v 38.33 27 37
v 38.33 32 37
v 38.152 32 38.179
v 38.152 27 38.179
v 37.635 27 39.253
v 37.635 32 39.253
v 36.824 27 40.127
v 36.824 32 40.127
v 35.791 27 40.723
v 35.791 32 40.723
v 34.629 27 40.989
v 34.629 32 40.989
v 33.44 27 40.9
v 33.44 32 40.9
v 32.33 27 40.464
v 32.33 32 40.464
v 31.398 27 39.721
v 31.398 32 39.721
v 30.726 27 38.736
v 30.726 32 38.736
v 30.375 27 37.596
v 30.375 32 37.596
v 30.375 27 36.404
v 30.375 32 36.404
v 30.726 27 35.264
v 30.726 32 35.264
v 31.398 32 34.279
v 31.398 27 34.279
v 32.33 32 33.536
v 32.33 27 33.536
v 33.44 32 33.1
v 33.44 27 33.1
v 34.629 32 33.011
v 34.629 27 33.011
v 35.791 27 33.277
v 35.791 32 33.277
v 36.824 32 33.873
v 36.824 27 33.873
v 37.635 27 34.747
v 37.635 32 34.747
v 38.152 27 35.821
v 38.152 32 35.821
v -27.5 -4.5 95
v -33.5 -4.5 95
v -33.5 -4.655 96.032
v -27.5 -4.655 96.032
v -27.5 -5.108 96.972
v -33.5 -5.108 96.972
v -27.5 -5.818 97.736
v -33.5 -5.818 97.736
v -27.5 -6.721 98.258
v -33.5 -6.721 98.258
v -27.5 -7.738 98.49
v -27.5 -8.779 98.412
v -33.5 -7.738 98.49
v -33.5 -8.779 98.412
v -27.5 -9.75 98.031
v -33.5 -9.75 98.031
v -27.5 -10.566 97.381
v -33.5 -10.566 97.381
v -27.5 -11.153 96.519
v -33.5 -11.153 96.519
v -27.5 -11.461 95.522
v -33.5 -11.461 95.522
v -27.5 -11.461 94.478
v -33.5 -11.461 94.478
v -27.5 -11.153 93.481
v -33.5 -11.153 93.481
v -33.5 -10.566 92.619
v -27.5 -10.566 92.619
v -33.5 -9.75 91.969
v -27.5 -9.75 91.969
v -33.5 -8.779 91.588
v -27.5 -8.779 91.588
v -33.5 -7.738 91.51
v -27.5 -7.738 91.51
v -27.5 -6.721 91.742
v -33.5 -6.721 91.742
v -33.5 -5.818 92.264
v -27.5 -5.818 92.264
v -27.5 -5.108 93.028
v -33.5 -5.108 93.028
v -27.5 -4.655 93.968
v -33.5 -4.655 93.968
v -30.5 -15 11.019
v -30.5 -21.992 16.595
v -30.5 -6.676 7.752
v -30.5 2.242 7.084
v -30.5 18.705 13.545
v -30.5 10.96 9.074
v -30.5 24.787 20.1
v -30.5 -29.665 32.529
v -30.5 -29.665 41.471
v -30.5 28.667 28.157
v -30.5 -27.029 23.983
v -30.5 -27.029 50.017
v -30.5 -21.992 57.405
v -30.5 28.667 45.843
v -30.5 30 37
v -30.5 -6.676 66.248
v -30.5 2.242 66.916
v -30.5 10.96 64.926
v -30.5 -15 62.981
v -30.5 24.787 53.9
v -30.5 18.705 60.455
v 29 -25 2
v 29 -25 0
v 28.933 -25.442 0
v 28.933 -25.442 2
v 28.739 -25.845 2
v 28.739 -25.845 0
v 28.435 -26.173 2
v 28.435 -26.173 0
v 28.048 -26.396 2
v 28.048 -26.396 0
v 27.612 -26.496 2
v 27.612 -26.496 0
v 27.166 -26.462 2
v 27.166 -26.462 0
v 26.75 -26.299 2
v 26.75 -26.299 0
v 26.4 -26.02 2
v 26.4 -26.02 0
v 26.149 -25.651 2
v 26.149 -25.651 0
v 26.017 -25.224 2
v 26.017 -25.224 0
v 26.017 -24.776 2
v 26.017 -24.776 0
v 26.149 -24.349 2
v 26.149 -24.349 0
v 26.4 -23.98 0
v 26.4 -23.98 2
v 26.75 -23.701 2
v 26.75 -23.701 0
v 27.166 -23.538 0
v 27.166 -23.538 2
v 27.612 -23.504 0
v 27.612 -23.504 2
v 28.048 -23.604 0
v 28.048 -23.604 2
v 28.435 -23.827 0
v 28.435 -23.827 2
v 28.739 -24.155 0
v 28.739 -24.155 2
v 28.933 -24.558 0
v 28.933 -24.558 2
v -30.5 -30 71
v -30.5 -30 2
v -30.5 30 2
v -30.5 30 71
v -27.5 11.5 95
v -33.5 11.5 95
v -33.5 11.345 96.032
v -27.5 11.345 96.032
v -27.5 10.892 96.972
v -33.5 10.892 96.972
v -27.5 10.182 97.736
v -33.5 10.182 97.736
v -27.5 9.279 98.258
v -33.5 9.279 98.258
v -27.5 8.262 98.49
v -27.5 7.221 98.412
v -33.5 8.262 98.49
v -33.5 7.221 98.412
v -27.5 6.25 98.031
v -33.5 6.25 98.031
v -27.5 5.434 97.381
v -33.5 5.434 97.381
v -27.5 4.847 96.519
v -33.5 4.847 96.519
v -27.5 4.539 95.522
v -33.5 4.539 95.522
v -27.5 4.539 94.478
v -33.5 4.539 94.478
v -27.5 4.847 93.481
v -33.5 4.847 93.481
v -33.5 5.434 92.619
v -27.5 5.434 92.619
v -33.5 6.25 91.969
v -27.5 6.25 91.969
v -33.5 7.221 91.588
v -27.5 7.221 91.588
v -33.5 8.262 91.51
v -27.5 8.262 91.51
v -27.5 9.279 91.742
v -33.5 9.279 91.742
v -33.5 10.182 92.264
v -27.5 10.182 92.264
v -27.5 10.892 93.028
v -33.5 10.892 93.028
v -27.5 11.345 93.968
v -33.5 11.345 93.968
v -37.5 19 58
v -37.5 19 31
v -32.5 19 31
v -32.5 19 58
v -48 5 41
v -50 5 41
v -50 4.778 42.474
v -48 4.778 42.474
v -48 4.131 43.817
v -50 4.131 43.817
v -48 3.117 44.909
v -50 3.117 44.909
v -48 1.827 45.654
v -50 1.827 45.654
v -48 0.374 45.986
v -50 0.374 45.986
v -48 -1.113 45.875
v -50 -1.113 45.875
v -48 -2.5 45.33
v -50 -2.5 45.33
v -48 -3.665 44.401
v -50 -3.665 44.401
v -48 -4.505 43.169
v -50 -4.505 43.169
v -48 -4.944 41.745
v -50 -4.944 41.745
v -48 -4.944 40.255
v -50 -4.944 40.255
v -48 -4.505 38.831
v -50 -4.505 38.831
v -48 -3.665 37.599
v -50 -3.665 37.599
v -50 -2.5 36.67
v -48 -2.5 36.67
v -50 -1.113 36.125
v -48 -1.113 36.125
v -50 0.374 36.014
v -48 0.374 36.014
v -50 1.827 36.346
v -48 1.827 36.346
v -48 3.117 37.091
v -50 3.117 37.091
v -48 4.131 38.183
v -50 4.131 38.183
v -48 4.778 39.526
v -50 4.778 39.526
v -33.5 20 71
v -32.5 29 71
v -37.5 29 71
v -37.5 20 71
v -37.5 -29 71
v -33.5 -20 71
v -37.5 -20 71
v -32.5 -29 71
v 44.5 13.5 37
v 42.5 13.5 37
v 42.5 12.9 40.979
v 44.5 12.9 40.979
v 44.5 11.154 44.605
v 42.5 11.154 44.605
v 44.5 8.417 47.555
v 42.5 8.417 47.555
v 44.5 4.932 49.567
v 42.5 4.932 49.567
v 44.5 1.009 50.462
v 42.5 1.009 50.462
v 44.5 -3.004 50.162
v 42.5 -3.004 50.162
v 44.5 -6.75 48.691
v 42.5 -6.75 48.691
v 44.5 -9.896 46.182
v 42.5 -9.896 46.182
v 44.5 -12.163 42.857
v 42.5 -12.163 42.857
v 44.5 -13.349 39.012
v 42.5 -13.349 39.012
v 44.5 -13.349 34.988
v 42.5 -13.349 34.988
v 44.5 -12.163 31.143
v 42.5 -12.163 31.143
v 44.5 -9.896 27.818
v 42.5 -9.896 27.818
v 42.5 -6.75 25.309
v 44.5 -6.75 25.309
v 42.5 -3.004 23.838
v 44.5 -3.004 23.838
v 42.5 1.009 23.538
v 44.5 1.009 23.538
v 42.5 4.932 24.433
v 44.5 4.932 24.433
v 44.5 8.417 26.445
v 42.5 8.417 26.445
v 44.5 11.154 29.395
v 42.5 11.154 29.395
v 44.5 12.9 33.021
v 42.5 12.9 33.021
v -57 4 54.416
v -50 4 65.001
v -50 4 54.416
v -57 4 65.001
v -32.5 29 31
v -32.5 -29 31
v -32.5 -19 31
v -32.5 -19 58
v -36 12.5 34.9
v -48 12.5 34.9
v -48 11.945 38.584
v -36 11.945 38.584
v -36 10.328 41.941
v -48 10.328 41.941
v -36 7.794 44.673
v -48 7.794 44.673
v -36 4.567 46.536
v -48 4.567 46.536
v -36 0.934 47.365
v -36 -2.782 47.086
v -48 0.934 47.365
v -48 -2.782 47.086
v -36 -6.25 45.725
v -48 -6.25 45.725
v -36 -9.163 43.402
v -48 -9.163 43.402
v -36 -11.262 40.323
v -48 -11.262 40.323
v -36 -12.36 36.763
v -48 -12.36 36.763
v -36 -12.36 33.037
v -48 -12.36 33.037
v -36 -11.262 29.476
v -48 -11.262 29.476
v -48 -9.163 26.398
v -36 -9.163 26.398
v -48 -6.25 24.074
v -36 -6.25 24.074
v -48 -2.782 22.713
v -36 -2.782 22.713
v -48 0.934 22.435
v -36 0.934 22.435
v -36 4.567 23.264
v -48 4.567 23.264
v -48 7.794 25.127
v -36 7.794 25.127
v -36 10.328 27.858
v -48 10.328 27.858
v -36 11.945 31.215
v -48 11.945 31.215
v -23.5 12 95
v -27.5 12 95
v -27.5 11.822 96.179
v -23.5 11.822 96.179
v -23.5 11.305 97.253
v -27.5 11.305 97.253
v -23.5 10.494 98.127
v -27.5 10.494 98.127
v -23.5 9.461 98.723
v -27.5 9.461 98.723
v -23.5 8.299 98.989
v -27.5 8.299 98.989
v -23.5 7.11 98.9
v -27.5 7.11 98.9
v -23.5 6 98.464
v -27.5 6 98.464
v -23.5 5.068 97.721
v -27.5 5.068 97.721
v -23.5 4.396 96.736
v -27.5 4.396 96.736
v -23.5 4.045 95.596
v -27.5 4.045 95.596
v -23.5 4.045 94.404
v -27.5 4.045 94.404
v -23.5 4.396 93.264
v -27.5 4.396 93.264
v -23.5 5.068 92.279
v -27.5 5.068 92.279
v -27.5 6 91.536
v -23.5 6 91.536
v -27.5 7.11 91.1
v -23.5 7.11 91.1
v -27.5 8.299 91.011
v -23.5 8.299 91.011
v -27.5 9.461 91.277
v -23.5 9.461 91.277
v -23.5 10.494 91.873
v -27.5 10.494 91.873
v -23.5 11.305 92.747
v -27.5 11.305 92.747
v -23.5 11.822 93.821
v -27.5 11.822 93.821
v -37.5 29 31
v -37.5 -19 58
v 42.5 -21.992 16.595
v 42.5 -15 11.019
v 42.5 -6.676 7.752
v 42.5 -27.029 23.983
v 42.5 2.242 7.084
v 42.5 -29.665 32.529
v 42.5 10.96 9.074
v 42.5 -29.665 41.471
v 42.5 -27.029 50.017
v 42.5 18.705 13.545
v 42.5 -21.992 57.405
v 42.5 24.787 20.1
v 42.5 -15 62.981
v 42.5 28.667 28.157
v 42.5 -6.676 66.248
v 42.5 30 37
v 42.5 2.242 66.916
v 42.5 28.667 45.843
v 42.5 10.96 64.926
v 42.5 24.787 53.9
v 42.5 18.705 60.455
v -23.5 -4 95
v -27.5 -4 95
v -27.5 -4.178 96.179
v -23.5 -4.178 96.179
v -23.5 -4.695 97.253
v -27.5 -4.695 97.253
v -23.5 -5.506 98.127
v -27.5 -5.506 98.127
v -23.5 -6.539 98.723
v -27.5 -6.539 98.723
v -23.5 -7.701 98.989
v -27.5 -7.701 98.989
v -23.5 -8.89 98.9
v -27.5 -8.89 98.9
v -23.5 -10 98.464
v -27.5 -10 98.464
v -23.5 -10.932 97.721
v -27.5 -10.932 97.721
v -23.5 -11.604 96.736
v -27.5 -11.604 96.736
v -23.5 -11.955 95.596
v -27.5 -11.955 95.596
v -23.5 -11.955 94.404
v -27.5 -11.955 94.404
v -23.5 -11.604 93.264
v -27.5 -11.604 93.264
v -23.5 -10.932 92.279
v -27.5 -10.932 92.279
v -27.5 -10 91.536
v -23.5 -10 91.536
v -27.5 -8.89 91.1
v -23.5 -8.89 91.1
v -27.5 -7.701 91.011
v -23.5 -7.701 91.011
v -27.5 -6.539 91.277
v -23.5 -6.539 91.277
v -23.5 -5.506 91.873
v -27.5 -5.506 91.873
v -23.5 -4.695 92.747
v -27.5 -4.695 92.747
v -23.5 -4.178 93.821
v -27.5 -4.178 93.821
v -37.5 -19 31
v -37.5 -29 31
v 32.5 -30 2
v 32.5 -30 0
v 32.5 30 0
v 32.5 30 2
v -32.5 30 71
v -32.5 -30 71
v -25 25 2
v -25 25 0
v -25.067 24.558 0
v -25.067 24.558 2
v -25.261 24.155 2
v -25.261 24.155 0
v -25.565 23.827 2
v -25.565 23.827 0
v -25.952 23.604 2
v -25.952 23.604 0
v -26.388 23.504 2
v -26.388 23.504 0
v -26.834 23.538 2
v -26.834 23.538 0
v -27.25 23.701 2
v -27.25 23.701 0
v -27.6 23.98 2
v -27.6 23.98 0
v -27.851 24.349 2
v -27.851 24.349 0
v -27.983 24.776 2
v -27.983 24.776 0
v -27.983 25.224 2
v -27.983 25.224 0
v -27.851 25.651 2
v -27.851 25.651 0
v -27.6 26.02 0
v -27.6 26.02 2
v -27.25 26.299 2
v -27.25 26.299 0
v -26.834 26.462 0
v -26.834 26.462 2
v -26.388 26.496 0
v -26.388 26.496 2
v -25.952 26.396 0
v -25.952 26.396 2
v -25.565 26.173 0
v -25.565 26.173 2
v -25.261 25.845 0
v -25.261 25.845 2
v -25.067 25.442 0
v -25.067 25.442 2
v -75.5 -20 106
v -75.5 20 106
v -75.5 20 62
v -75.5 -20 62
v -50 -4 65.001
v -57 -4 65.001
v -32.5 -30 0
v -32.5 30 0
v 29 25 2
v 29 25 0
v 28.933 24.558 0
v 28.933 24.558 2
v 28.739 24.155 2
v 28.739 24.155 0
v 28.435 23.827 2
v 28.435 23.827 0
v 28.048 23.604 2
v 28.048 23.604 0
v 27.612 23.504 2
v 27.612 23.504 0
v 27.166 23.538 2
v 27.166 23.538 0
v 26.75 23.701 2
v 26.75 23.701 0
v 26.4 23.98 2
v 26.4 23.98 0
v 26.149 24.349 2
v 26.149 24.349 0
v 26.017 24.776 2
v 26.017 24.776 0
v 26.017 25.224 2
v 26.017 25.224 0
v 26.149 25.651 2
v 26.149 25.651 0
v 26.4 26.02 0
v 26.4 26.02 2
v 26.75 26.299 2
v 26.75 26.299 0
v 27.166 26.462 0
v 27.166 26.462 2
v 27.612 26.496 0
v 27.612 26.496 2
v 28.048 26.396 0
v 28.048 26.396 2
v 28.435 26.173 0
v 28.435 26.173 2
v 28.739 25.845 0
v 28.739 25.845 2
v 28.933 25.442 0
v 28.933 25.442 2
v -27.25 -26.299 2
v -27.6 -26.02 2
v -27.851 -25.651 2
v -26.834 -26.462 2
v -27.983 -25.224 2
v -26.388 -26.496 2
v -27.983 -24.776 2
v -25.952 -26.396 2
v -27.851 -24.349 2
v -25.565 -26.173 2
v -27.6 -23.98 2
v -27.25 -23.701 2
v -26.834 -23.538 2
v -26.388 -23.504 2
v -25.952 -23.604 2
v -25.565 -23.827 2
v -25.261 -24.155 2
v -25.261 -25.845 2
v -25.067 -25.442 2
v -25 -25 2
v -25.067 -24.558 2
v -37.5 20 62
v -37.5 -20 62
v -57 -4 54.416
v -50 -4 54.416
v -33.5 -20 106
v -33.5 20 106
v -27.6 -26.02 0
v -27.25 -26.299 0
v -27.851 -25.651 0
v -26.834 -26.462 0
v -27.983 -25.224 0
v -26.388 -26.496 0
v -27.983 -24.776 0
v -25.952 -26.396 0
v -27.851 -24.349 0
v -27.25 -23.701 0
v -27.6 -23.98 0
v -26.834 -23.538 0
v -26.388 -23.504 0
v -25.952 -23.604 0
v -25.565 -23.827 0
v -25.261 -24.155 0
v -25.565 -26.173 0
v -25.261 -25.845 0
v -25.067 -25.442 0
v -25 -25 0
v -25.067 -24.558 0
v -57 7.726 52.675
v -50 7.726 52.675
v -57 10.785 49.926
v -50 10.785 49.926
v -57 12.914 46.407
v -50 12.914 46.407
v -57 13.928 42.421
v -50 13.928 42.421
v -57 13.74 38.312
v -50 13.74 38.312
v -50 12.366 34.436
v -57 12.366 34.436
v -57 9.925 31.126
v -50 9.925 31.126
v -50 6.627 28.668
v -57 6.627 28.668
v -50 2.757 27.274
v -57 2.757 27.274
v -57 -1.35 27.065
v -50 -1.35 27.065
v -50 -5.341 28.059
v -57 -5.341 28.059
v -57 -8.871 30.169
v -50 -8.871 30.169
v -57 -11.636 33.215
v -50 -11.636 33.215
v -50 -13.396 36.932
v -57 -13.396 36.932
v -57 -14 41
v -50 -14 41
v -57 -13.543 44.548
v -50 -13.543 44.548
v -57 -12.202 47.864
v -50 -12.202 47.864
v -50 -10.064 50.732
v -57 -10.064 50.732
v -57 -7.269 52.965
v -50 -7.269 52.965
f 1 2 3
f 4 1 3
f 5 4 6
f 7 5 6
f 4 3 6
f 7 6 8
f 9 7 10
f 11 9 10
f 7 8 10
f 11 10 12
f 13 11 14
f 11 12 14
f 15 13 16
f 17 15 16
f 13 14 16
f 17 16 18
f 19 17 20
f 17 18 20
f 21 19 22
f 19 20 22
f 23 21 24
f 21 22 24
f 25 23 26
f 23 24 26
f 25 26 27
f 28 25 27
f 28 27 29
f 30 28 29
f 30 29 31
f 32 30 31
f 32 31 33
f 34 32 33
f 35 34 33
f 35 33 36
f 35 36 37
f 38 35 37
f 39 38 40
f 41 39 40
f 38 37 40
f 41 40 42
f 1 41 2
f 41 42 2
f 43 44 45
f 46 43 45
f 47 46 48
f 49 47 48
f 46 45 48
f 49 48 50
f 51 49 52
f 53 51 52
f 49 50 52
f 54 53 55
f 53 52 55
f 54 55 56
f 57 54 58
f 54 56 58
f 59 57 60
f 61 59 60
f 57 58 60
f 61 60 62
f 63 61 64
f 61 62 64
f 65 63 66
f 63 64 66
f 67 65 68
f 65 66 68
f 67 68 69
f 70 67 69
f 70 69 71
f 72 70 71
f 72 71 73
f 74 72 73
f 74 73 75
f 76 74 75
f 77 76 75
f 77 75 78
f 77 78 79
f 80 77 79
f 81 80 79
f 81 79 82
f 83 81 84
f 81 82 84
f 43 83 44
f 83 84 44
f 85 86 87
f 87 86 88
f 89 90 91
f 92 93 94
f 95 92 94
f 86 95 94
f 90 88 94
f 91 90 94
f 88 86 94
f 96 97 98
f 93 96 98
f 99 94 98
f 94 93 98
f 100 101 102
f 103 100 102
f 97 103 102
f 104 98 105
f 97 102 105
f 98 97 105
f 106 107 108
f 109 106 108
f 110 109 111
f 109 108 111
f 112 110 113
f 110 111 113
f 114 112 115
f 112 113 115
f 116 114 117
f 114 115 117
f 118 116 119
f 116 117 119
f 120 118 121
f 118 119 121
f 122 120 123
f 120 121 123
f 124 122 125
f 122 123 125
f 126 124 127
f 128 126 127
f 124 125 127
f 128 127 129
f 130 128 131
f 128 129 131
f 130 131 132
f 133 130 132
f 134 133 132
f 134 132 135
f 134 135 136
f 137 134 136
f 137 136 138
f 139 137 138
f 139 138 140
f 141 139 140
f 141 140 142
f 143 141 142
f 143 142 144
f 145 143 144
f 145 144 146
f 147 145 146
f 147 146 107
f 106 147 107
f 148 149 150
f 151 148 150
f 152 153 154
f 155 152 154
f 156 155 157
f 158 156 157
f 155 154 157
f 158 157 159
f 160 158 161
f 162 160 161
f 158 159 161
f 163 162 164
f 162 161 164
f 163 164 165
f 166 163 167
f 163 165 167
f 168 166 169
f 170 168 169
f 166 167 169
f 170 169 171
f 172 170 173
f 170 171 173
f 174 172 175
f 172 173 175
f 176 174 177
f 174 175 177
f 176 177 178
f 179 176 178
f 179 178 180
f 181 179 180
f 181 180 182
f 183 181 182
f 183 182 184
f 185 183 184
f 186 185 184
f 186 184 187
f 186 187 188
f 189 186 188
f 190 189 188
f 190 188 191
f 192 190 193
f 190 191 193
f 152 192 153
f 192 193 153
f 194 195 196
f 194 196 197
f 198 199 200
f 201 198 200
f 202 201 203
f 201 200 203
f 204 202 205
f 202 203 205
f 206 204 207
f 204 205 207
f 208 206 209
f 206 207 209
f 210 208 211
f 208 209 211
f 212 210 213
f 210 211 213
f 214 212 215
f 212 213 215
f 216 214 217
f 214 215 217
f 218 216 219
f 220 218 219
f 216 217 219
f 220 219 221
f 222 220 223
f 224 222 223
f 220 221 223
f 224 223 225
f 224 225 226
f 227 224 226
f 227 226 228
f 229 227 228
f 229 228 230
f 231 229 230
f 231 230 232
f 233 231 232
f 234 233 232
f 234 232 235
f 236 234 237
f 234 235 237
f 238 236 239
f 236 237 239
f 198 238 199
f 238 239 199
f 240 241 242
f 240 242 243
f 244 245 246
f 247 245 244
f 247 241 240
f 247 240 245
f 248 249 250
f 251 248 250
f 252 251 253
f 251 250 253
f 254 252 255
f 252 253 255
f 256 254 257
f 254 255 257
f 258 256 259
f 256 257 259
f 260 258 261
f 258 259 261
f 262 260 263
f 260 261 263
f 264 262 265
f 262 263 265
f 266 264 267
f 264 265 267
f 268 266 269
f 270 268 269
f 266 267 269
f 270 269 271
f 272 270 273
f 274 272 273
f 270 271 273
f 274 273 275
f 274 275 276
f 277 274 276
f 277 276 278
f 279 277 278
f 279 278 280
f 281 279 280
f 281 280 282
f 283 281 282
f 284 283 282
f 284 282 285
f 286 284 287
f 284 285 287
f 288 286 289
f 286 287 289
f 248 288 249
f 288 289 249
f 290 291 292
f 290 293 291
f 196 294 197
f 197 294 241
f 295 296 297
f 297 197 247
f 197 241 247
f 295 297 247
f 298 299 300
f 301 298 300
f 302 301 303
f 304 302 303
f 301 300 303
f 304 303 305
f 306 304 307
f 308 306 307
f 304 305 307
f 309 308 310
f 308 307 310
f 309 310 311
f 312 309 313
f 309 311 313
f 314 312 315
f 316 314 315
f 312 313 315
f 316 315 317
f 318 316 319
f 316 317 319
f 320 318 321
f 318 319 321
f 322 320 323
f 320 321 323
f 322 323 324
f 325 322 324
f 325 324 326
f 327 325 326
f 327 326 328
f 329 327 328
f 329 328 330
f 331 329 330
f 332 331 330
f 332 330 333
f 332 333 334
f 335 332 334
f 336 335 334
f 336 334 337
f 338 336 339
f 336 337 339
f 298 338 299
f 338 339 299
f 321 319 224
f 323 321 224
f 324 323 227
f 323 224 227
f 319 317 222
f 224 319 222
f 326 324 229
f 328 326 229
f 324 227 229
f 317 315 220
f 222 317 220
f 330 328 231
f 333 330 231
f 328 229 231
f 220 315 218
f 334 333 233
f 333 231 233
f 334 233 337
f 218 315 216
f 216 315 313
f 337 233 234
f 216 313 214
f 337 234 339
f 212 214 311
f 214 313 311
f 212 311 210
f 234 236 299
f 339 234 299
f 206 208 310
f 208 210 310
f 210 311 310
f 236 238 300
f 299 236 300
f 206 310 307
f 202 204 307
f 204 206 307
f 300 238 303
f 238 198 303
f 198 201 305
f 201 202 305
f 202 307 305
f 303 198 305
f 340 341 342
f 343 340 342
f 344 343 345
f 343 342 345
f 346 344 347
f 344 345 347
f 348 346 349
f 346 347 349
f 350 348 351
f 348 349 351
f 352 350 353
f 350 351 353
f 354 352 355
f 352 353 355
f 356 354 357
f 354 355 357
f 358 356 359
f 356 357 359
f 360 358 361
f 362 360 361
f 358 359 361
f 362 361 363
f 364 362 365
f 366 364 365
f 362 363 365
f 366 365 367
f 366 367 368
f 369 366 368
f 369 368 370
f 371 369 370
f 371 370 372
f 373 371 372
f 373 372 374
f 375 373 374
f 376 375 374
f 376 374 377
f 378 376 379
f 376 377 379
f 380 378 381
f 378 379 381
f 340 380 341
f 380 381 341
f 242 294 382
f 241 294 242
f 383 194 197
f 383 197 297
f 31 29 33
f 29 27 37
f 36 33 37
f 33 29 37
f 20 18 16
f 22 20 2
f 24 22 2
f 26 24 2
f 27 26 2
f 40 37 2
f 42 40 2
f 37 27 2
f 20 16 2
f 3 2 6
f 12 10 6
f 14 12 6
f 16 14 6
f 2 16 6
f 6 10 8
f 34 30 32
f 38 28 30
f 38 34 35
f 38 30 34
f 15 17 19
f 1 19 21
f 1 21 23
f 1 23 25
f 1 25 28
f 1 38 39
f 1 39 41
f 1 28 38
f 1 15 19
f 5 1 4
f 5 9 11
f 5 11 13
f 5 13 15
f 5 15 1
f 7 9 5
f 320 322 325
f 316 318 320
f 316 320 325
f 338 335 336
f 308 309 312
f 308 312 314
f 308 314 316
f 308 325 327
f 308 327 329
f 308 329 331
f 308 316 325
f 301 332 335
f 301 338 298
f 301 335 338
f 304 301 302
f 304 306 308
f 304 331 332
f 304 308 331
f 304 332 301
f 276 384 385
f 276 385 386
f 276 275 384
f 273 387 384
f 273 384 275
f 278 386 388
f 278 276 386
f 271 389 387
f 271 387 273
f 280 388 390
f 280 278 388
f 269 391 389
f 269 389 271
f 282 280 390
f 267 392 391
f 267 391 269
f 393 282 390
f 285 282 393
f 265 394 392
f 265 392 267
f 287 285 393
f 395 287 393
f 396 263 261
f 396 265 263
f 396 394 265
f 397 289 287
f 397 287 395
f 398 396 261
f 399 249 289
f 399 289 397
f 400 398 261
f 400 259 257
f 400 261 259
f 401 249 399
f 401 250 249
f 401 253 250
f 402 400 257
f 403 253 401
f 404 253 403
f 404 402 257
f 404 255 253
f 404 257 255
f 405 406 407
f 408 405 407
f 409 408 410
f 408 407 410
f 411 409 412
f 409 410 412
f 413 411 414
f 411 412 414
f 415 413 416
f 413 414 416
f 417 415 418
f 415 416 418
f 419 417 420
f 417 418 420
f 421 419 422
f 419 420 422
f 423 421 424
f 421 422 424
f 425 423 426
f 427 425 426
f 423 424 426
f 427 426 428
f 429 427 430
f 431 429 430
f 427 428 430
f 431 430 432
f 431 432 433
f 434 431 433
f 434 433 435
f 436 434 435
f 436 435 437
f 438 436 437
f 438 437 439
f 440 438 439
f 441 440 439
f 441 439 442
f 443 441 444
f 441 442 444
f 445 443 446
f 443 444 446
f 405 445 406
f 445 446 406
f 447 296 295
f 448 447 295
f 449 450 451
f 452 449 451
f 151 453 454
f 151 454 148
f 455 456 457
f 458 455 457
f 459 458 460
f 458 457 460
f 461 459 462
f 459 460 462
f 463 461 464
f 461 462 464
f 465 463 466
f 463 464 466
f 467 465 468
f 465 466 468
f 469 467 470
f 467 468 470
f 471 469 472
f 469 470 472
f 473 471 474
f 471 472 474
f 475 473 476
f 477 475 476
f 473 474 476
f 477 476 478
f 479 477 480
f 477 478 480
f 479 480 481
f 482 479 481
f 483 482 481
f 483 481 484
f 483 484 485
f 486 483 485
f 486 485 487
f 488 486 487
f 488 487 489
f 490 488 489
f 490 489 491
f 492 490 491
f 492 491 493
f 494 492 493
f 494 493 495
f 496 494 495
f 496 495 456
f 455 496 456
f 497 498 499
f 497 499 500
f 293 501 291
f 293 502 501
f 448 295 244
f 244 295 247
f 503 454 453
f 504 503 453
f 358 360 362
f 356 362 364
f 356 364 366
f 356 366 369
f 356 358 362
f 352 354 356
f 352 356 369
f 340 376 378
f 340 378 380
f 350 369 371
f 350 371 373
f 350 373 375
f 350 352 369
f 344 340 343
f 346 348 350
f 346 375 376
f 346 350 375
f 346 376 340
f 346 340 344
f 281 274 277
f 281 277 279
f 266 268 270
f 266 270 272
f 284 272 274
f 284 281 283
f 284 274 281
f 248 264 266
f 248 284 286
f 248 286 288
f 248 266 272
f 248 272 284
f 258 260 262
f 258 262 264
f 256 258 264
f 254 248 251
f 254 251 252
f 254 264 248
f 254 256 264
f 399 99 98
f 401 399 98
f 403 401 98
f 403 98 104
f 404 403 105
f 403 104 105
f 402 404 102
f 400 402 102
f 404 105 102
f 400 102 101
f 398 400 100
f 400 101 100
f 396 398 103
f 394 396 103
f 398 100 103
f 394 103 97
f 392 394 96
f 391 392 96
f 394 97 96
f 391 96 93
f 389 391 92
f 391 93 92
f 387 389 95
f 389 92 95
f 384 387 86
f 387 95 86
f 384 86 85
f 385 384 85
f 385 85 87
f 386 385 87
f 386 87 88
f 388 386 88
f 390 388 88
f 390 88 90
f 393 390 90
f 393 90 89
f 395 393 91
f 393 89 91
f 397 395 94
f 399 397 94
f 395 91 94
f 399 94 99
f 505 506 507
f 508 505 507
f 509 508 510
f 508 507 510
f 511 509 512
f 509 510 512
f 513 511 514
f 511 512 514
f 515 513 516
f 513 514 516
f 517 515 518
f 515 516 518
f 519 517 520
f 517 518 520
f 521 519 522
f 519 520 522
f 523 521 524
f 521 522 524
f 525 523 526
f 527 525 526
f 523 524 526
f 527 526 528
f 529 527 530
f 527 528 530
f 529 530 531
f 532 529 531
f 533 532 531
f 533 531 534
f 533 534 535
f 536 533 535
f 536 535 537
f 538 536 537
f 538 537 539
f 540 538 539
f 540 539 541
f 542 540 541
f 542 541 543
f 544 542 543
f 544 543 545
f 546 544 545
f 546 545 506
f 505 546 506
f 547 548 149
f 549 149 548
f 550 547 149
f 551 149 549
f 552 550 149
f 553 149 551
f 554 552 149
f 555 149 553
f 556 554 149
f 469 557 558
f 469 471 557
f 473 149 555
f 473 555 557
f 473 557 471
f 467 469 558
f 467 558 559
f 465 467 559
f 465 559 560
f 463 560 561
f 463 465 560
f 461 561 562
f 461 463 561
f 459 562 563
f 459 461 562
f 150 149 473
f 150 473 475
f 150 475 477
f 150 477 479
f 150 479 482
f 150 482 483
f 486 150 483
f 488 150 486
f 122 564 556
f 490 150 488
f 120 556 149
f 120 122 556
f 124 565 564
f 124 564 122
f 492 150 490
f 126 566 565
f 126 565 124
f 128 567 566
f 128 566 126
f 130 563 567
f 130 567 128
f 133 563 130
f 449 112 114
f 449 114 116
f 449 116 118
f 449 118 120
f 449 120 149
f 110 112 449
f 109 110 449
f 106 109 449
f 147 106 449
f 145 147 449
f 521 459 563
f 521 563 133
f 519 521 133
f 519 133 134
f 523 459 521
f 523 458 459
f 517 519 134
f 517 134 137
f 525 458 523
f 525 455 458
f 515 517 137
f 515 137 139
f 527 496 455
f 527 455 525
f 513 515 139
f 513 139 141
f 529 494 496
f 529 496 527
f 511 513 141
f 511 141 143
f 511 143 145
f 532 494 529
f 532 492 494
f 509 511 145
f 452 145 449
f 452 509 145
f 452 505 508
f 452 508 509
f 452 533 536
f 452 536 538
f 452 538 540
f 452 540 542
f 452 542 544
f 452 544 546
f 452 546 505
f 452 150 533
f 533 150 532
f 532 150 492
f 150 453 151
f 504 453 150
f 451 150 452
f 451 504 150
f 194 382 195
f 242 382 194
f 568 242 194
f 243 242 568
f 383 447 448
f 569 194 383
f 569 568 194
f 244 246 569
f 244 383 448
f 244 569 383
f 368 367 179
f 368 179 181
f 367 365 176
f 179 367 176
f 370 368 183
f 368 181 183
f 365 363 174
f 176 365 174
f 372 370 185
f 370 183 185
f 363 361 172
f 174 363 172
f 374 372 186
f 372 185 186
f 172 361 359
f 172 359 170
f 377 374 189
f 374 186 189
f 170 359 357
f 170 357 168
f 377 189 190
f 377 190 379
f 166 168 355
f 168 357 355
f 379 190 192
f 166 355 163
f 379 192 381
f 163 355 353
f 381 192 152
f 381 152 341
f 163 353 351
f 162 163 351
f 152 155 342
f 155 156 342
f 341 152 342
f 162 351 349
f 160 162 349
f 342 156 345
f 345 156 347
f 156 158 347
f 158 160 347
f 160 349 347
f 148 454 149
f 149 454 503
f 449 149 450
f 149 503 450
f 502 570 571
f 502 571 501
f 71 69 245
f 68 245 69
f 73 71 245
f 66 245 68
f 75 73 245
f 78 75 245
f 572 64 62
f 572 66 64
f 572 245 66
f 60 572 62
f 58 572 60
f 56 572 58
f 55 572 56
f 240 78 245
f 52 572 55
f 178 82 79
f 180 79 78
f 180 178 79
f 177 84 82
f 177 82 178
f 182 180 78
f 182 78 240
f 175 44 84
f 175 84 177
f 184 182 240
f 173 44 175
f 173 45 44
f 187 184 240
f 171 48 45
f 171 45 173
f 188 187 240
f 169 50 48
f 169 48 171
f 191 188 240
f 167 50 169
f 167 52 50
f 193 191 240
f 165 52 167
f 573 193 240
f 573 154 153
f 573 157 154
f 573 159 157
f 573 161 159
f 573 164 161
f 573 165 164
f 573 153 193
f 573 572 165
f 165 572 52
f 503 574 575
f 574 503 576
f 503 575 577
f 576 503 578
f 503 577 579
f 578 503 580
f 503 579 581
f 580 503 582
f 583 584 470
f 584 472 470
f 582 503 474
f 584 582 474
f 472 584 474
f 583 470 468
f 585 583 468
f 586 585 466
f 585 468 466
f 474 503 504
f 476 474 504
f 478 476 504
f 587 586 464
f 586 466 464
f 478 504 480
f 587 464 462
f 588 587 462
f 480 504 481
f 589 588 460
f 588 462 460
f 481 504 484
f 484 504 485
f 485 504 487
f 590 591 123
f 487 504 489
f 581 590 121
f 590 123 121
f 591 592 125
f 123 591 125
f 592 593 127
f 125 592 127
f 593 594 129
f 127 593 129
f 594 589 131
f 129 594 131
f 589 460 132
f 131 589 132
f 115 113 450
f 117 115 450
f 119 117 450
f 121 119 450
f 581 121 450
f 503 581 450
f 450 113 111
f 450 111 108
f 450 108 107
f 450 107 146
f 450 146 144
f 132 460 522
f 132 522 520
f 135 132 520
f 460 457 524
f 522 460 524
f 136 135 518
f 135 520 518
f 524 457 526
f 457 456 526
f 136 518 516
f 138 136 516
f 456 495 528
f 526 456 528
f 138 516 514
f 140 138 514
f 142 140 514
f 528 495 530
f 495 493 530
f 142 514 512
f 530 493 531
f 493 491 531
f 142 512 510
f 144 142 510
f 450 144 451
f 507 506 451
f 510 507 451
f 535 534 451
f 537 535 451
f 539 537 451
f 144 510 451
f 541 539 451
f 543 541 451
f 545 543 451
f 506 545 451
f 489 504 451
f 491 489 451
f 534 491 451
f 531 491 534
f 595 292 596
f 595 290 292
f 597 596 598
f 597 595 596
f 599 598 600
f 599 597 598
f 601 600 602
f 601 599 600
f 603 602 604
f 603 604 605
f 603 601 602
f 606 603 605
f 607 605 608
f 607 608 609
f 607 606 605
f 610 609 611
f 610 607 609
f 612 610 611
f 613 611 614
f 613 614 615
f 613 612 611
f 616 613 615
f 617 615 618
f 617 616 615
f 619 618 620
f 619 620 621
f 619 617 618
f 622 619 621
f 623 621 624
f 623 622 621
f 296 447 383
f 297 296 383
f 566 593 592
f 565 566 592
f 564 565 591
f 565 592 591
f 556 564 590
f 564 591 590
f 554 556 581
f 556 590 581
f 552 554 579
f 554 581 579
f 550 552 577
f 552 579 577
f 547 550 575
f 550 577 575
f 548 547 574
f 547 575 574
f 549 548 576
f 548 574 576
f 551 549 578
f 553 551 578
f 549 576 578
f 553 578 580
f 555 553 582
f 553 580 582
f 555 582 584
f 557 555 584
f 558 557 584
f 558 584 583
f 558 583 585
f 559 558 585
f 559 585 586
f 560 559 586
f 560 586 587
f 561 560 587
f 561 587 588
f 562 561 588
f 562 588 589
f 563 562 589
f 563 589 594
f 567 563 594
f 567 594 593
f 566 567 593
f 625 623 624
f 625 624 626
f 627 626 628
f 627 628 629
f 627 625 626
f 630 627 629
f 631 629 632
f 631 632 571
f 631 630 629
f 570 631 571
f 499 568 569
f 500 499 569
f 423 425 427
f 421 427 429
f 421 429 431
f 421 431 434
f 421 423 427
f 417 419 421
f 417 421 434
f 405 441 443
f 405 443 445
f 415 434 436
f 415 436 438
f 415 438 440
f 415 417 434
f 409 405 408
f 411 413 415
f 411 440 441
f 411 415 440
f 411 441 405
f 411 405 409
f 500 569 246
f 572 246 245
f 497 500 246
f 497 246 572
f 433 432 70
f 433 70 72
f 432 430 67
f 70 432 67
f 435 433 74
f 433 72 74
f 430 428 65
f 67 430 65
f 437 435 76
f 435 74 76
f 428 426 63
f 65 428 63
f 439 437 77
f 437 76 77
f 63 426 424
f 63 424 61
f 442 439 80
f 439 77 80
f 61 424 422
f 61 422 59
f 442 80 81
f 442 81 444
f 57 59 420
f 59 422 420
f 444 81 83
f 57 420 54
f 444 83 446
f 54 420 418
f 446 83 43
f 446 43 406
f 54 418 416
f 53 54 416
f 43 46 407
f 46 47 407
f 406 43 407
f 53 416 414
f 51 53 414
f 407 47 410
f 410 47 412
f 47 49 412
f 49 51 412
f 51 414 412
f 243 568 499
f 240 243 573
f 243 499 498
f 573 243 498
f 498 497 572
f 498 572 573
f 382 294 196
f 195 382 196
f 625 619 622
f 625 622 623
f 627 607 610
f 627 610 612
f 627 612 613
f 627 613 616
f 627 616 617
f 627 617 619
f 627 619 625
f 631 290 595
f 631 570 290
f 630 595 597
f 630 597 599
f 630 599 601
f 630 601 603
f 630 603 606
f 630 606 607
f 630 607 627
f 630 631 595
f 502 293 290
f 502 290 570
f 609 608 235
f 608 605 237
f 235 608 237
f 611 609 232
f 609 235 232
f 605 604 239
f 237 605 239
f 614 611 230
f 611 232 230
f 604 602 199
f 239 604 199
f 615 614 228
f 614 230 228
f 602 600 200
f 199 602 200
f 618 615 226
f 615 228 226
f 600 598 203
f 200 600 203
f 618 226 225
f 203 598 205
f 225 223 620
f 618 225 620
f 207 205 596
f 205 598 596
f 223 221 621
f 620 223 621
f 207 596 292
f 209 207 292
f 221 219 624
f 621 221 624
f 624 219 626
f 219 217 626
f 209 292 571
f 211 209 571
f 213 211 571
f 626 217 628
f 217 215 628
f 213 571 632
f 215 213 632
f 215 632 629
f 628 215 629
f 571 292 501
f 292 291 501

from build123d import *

# Parameters (mm, degrees)
F0_W      = 65
F0_H      = 60
F1_DEPTH  = 2
F2_W      = 2
F2_H      = 60
F3_DEPTH  = 69
F5_DEPTH  = 73
F6_R      = 13.5
F7_DEPTH  = 2
F8_W      = 58
F8_H      = 40
F9_DEPTH  = 5
F10_W     = 38
F10_H     = 27
F11_DEPTH = 5
F12_W     = 40
F12_H     = 44
F13_DEPTH = 38
F14_W     = 40
F14_H     = 35
F15_DEPTH = 4
F16_R     = 3.5
F17_DEPTH = 6
F18_R     = 4
F19_DEPTH = 4
F22_DEPTH = 3.5
F23_R     = 5
F24_DEPTH = 2
F25_R     = 12.5
F26_DEPTH = 12
F28_R     = 4
F29_DEPTH = 5
F30_R     = 1.5
F31_DEPTH = 25


with BuildPart() as f1:
    # F0 (on Top) → F1 (new body)
    with BuildSketch(Plane.XY):
        Rectangle(F0_W, F0_H)
    extrude(amount=F1_DEPTH)

    # F2 (on face) → F3 (join)
    with BuildSketch(Plane.XY.offset(2)):
        with Locations((-31.5, 0)):
            Rectangle(F2_W, F2_H)
    extrude(amount=F3_DEPTH)

    # F30 (on face) → F31 (cut)
    with BuildSketch(Plane(origin=(0, 0, 0), x_dir=(1, 0, 0), z_dir=(0, 0, -1))):
        with Locations((27.5, 25)):
            Circle(F30_R)
        with Locations((27.5, -25)):
            Circle(F30_R)
        with Locations((-26.5, 25)):
            Circle(F30_R)
        with Locations((-26.5, -25)):
            Circle(F30_R)
    extrude(amount=-F31_DEPTH, mode=Mode.SUBTRACT)


with BuildPart() as f5:
    # F4 (on face) → F5 (new body)
    with BuildSketch(Plane.YZ.offset(-30.5)):
        with BuildLine():
            ThreePointArc((-30, 37), (0, 7), (30, 37))
            ThreePointArc((30, 37), (0, 67), (-30, 37))
        make_face()
    extrude(amount=F5_DEPTH)

    # F6 (on face) → F7 (join)
    with BuildSketch(Plane.YZ.offset(42.5)):
        with Locations((0, 37)):
            Circle(F6_R)
    extrude(amount=F7_DEPTH)


with BuildPart() as f9:
    # F8 (on face) → F9 (new body)
    with BuildSketch(Plane(origin=(-32.5, 0, 0), x_dir=(0, -1, 0), z_dir=(-1, 0, 0))):
        with Locations((0, 51)):
            Rectangle(F8_W, F8_H)
    extrude(amount=F9_DEPTH)

    # F10 (on face) → F11 (cut, through all)
    with BuildSketch(Plane(origin=(-37.5, 0, 0), x_dir=(0, -1, 0), z_dir=(-1, 0, 0))):
        with Locations((0, 44.5)):
            Rectangle(F10_W, F10_H)
    extrude(amount=-F11_DEPTH, mode=Mode.SUBTRACT)

    # F12 (on face) → F13 (join)
    with BuildSketch(Plane(origin=(-37.5, 0, 0), x_dir=(0, -1, 0), z_dir=(-1, 0, 0))):
        with Locations((0, 84)):
            Rectangle(F12_W, F12_H)
    extrude(amount=F13_DEPTH)

    # F14 (on face) → F15 (join)
    with BuildSketch(Plane.YZ.offset(-37.5)):
        with Locations((0, 88.5)):
            Rectangle(F14_W, F14_H)
    extrude(amount=F15_DEPTH)

    # F16 (on face) → F17 (join)
    with BuildSketch(Plane.YZ.offset(-33.5)):
        with Locations((8, 95)):
            Circle(F16_R)
        with Locations((-8, 95)):
            Circle(F16_R)
    extrude(amount=F17_DEPTH)

    # F18 (on face) → F19 (join)
    with BuildSketch(Plane.YZ.offset(-27.5)):
        with Locations((8, 95)):
            Circle(F18_R)
        with Locations((-8, 95)):
            Circle(F18_R)
    extrude(amount=F19_DEPTH)


with BuildPart() as f22:
    # F21 (on offset) → F22 (new body, symmetric)
    with BuildSketch(Plane(origin=(-53.5, 0, 0), x_dir=(0, -1, 0), z_dir=(-1, 0, 0))):
        with BuildLine():
            Line((4, 43.0200397968), (4, 54.416407865))
            ThreePointArc((4, 54.416407865), (0, 55), (-4, 54.416407865))
            Line((-4, 54.416407865), (-4, 43.0200397968))
            Line((-4, 43.0200397968), (4, 43.0200397968))
        make_face()
        with BuildLine():
            ThreePointArc((-4, 54.416407865), (-8.3666002653, 29.7750278397), (14, 41))
            ThreePointArc((14, 41), (11.2249721603, 49.3666002653), (4, 54.416407865))
            Line((4, 54.416407865), (4, 43.0200397968))
            Line((4, 43.0200397968), (-4, 43.0200397968))
            Line((-4, 43.0200397968), (-4, 54.416407865))
        make_face()
        with BuildLine():
            ThreePointArc((-4, 54.416407865), (0, 55), (4, 54.416407865))
            Line((4, 54.416407865), (4, 65.0006011128))
            Line((4, 65.0006011128), (-4, 65.0006011128))
            Line((-4, 65.0006011128), (-4, 54.416407865))
        make_face()
    extrude(amount=F22_DEPTH, both=True)

    # F23 (on face) → F24 (join)
    with BuildSketch(Plane.YZ.offset(-50)):
        with Locations((0, 41)):
            Circle(F23_R)
    extrude(amount=F24_DEPTH)

    # F25 (on face) → F26 (join)
    with BuildSketch(Plane.YZ.offset(-48)):
        with Locations((0, 34.8997488618)):
            Circle(F25_R)
    extrude(amount=F26_DEPTH)


with BuildPart() as f29:
    # F28 (on offset) → F29 (new body)
    with BuildSketch(Plane.XZ.offset(-32)):
        with Locations((34.3298651278, 37)):
            Circle(F28_R)
    extrude(amount=F29_DEPTH)


solid = Compound([f1.part, f5.part, f9.part, f22.part, f29.part])
